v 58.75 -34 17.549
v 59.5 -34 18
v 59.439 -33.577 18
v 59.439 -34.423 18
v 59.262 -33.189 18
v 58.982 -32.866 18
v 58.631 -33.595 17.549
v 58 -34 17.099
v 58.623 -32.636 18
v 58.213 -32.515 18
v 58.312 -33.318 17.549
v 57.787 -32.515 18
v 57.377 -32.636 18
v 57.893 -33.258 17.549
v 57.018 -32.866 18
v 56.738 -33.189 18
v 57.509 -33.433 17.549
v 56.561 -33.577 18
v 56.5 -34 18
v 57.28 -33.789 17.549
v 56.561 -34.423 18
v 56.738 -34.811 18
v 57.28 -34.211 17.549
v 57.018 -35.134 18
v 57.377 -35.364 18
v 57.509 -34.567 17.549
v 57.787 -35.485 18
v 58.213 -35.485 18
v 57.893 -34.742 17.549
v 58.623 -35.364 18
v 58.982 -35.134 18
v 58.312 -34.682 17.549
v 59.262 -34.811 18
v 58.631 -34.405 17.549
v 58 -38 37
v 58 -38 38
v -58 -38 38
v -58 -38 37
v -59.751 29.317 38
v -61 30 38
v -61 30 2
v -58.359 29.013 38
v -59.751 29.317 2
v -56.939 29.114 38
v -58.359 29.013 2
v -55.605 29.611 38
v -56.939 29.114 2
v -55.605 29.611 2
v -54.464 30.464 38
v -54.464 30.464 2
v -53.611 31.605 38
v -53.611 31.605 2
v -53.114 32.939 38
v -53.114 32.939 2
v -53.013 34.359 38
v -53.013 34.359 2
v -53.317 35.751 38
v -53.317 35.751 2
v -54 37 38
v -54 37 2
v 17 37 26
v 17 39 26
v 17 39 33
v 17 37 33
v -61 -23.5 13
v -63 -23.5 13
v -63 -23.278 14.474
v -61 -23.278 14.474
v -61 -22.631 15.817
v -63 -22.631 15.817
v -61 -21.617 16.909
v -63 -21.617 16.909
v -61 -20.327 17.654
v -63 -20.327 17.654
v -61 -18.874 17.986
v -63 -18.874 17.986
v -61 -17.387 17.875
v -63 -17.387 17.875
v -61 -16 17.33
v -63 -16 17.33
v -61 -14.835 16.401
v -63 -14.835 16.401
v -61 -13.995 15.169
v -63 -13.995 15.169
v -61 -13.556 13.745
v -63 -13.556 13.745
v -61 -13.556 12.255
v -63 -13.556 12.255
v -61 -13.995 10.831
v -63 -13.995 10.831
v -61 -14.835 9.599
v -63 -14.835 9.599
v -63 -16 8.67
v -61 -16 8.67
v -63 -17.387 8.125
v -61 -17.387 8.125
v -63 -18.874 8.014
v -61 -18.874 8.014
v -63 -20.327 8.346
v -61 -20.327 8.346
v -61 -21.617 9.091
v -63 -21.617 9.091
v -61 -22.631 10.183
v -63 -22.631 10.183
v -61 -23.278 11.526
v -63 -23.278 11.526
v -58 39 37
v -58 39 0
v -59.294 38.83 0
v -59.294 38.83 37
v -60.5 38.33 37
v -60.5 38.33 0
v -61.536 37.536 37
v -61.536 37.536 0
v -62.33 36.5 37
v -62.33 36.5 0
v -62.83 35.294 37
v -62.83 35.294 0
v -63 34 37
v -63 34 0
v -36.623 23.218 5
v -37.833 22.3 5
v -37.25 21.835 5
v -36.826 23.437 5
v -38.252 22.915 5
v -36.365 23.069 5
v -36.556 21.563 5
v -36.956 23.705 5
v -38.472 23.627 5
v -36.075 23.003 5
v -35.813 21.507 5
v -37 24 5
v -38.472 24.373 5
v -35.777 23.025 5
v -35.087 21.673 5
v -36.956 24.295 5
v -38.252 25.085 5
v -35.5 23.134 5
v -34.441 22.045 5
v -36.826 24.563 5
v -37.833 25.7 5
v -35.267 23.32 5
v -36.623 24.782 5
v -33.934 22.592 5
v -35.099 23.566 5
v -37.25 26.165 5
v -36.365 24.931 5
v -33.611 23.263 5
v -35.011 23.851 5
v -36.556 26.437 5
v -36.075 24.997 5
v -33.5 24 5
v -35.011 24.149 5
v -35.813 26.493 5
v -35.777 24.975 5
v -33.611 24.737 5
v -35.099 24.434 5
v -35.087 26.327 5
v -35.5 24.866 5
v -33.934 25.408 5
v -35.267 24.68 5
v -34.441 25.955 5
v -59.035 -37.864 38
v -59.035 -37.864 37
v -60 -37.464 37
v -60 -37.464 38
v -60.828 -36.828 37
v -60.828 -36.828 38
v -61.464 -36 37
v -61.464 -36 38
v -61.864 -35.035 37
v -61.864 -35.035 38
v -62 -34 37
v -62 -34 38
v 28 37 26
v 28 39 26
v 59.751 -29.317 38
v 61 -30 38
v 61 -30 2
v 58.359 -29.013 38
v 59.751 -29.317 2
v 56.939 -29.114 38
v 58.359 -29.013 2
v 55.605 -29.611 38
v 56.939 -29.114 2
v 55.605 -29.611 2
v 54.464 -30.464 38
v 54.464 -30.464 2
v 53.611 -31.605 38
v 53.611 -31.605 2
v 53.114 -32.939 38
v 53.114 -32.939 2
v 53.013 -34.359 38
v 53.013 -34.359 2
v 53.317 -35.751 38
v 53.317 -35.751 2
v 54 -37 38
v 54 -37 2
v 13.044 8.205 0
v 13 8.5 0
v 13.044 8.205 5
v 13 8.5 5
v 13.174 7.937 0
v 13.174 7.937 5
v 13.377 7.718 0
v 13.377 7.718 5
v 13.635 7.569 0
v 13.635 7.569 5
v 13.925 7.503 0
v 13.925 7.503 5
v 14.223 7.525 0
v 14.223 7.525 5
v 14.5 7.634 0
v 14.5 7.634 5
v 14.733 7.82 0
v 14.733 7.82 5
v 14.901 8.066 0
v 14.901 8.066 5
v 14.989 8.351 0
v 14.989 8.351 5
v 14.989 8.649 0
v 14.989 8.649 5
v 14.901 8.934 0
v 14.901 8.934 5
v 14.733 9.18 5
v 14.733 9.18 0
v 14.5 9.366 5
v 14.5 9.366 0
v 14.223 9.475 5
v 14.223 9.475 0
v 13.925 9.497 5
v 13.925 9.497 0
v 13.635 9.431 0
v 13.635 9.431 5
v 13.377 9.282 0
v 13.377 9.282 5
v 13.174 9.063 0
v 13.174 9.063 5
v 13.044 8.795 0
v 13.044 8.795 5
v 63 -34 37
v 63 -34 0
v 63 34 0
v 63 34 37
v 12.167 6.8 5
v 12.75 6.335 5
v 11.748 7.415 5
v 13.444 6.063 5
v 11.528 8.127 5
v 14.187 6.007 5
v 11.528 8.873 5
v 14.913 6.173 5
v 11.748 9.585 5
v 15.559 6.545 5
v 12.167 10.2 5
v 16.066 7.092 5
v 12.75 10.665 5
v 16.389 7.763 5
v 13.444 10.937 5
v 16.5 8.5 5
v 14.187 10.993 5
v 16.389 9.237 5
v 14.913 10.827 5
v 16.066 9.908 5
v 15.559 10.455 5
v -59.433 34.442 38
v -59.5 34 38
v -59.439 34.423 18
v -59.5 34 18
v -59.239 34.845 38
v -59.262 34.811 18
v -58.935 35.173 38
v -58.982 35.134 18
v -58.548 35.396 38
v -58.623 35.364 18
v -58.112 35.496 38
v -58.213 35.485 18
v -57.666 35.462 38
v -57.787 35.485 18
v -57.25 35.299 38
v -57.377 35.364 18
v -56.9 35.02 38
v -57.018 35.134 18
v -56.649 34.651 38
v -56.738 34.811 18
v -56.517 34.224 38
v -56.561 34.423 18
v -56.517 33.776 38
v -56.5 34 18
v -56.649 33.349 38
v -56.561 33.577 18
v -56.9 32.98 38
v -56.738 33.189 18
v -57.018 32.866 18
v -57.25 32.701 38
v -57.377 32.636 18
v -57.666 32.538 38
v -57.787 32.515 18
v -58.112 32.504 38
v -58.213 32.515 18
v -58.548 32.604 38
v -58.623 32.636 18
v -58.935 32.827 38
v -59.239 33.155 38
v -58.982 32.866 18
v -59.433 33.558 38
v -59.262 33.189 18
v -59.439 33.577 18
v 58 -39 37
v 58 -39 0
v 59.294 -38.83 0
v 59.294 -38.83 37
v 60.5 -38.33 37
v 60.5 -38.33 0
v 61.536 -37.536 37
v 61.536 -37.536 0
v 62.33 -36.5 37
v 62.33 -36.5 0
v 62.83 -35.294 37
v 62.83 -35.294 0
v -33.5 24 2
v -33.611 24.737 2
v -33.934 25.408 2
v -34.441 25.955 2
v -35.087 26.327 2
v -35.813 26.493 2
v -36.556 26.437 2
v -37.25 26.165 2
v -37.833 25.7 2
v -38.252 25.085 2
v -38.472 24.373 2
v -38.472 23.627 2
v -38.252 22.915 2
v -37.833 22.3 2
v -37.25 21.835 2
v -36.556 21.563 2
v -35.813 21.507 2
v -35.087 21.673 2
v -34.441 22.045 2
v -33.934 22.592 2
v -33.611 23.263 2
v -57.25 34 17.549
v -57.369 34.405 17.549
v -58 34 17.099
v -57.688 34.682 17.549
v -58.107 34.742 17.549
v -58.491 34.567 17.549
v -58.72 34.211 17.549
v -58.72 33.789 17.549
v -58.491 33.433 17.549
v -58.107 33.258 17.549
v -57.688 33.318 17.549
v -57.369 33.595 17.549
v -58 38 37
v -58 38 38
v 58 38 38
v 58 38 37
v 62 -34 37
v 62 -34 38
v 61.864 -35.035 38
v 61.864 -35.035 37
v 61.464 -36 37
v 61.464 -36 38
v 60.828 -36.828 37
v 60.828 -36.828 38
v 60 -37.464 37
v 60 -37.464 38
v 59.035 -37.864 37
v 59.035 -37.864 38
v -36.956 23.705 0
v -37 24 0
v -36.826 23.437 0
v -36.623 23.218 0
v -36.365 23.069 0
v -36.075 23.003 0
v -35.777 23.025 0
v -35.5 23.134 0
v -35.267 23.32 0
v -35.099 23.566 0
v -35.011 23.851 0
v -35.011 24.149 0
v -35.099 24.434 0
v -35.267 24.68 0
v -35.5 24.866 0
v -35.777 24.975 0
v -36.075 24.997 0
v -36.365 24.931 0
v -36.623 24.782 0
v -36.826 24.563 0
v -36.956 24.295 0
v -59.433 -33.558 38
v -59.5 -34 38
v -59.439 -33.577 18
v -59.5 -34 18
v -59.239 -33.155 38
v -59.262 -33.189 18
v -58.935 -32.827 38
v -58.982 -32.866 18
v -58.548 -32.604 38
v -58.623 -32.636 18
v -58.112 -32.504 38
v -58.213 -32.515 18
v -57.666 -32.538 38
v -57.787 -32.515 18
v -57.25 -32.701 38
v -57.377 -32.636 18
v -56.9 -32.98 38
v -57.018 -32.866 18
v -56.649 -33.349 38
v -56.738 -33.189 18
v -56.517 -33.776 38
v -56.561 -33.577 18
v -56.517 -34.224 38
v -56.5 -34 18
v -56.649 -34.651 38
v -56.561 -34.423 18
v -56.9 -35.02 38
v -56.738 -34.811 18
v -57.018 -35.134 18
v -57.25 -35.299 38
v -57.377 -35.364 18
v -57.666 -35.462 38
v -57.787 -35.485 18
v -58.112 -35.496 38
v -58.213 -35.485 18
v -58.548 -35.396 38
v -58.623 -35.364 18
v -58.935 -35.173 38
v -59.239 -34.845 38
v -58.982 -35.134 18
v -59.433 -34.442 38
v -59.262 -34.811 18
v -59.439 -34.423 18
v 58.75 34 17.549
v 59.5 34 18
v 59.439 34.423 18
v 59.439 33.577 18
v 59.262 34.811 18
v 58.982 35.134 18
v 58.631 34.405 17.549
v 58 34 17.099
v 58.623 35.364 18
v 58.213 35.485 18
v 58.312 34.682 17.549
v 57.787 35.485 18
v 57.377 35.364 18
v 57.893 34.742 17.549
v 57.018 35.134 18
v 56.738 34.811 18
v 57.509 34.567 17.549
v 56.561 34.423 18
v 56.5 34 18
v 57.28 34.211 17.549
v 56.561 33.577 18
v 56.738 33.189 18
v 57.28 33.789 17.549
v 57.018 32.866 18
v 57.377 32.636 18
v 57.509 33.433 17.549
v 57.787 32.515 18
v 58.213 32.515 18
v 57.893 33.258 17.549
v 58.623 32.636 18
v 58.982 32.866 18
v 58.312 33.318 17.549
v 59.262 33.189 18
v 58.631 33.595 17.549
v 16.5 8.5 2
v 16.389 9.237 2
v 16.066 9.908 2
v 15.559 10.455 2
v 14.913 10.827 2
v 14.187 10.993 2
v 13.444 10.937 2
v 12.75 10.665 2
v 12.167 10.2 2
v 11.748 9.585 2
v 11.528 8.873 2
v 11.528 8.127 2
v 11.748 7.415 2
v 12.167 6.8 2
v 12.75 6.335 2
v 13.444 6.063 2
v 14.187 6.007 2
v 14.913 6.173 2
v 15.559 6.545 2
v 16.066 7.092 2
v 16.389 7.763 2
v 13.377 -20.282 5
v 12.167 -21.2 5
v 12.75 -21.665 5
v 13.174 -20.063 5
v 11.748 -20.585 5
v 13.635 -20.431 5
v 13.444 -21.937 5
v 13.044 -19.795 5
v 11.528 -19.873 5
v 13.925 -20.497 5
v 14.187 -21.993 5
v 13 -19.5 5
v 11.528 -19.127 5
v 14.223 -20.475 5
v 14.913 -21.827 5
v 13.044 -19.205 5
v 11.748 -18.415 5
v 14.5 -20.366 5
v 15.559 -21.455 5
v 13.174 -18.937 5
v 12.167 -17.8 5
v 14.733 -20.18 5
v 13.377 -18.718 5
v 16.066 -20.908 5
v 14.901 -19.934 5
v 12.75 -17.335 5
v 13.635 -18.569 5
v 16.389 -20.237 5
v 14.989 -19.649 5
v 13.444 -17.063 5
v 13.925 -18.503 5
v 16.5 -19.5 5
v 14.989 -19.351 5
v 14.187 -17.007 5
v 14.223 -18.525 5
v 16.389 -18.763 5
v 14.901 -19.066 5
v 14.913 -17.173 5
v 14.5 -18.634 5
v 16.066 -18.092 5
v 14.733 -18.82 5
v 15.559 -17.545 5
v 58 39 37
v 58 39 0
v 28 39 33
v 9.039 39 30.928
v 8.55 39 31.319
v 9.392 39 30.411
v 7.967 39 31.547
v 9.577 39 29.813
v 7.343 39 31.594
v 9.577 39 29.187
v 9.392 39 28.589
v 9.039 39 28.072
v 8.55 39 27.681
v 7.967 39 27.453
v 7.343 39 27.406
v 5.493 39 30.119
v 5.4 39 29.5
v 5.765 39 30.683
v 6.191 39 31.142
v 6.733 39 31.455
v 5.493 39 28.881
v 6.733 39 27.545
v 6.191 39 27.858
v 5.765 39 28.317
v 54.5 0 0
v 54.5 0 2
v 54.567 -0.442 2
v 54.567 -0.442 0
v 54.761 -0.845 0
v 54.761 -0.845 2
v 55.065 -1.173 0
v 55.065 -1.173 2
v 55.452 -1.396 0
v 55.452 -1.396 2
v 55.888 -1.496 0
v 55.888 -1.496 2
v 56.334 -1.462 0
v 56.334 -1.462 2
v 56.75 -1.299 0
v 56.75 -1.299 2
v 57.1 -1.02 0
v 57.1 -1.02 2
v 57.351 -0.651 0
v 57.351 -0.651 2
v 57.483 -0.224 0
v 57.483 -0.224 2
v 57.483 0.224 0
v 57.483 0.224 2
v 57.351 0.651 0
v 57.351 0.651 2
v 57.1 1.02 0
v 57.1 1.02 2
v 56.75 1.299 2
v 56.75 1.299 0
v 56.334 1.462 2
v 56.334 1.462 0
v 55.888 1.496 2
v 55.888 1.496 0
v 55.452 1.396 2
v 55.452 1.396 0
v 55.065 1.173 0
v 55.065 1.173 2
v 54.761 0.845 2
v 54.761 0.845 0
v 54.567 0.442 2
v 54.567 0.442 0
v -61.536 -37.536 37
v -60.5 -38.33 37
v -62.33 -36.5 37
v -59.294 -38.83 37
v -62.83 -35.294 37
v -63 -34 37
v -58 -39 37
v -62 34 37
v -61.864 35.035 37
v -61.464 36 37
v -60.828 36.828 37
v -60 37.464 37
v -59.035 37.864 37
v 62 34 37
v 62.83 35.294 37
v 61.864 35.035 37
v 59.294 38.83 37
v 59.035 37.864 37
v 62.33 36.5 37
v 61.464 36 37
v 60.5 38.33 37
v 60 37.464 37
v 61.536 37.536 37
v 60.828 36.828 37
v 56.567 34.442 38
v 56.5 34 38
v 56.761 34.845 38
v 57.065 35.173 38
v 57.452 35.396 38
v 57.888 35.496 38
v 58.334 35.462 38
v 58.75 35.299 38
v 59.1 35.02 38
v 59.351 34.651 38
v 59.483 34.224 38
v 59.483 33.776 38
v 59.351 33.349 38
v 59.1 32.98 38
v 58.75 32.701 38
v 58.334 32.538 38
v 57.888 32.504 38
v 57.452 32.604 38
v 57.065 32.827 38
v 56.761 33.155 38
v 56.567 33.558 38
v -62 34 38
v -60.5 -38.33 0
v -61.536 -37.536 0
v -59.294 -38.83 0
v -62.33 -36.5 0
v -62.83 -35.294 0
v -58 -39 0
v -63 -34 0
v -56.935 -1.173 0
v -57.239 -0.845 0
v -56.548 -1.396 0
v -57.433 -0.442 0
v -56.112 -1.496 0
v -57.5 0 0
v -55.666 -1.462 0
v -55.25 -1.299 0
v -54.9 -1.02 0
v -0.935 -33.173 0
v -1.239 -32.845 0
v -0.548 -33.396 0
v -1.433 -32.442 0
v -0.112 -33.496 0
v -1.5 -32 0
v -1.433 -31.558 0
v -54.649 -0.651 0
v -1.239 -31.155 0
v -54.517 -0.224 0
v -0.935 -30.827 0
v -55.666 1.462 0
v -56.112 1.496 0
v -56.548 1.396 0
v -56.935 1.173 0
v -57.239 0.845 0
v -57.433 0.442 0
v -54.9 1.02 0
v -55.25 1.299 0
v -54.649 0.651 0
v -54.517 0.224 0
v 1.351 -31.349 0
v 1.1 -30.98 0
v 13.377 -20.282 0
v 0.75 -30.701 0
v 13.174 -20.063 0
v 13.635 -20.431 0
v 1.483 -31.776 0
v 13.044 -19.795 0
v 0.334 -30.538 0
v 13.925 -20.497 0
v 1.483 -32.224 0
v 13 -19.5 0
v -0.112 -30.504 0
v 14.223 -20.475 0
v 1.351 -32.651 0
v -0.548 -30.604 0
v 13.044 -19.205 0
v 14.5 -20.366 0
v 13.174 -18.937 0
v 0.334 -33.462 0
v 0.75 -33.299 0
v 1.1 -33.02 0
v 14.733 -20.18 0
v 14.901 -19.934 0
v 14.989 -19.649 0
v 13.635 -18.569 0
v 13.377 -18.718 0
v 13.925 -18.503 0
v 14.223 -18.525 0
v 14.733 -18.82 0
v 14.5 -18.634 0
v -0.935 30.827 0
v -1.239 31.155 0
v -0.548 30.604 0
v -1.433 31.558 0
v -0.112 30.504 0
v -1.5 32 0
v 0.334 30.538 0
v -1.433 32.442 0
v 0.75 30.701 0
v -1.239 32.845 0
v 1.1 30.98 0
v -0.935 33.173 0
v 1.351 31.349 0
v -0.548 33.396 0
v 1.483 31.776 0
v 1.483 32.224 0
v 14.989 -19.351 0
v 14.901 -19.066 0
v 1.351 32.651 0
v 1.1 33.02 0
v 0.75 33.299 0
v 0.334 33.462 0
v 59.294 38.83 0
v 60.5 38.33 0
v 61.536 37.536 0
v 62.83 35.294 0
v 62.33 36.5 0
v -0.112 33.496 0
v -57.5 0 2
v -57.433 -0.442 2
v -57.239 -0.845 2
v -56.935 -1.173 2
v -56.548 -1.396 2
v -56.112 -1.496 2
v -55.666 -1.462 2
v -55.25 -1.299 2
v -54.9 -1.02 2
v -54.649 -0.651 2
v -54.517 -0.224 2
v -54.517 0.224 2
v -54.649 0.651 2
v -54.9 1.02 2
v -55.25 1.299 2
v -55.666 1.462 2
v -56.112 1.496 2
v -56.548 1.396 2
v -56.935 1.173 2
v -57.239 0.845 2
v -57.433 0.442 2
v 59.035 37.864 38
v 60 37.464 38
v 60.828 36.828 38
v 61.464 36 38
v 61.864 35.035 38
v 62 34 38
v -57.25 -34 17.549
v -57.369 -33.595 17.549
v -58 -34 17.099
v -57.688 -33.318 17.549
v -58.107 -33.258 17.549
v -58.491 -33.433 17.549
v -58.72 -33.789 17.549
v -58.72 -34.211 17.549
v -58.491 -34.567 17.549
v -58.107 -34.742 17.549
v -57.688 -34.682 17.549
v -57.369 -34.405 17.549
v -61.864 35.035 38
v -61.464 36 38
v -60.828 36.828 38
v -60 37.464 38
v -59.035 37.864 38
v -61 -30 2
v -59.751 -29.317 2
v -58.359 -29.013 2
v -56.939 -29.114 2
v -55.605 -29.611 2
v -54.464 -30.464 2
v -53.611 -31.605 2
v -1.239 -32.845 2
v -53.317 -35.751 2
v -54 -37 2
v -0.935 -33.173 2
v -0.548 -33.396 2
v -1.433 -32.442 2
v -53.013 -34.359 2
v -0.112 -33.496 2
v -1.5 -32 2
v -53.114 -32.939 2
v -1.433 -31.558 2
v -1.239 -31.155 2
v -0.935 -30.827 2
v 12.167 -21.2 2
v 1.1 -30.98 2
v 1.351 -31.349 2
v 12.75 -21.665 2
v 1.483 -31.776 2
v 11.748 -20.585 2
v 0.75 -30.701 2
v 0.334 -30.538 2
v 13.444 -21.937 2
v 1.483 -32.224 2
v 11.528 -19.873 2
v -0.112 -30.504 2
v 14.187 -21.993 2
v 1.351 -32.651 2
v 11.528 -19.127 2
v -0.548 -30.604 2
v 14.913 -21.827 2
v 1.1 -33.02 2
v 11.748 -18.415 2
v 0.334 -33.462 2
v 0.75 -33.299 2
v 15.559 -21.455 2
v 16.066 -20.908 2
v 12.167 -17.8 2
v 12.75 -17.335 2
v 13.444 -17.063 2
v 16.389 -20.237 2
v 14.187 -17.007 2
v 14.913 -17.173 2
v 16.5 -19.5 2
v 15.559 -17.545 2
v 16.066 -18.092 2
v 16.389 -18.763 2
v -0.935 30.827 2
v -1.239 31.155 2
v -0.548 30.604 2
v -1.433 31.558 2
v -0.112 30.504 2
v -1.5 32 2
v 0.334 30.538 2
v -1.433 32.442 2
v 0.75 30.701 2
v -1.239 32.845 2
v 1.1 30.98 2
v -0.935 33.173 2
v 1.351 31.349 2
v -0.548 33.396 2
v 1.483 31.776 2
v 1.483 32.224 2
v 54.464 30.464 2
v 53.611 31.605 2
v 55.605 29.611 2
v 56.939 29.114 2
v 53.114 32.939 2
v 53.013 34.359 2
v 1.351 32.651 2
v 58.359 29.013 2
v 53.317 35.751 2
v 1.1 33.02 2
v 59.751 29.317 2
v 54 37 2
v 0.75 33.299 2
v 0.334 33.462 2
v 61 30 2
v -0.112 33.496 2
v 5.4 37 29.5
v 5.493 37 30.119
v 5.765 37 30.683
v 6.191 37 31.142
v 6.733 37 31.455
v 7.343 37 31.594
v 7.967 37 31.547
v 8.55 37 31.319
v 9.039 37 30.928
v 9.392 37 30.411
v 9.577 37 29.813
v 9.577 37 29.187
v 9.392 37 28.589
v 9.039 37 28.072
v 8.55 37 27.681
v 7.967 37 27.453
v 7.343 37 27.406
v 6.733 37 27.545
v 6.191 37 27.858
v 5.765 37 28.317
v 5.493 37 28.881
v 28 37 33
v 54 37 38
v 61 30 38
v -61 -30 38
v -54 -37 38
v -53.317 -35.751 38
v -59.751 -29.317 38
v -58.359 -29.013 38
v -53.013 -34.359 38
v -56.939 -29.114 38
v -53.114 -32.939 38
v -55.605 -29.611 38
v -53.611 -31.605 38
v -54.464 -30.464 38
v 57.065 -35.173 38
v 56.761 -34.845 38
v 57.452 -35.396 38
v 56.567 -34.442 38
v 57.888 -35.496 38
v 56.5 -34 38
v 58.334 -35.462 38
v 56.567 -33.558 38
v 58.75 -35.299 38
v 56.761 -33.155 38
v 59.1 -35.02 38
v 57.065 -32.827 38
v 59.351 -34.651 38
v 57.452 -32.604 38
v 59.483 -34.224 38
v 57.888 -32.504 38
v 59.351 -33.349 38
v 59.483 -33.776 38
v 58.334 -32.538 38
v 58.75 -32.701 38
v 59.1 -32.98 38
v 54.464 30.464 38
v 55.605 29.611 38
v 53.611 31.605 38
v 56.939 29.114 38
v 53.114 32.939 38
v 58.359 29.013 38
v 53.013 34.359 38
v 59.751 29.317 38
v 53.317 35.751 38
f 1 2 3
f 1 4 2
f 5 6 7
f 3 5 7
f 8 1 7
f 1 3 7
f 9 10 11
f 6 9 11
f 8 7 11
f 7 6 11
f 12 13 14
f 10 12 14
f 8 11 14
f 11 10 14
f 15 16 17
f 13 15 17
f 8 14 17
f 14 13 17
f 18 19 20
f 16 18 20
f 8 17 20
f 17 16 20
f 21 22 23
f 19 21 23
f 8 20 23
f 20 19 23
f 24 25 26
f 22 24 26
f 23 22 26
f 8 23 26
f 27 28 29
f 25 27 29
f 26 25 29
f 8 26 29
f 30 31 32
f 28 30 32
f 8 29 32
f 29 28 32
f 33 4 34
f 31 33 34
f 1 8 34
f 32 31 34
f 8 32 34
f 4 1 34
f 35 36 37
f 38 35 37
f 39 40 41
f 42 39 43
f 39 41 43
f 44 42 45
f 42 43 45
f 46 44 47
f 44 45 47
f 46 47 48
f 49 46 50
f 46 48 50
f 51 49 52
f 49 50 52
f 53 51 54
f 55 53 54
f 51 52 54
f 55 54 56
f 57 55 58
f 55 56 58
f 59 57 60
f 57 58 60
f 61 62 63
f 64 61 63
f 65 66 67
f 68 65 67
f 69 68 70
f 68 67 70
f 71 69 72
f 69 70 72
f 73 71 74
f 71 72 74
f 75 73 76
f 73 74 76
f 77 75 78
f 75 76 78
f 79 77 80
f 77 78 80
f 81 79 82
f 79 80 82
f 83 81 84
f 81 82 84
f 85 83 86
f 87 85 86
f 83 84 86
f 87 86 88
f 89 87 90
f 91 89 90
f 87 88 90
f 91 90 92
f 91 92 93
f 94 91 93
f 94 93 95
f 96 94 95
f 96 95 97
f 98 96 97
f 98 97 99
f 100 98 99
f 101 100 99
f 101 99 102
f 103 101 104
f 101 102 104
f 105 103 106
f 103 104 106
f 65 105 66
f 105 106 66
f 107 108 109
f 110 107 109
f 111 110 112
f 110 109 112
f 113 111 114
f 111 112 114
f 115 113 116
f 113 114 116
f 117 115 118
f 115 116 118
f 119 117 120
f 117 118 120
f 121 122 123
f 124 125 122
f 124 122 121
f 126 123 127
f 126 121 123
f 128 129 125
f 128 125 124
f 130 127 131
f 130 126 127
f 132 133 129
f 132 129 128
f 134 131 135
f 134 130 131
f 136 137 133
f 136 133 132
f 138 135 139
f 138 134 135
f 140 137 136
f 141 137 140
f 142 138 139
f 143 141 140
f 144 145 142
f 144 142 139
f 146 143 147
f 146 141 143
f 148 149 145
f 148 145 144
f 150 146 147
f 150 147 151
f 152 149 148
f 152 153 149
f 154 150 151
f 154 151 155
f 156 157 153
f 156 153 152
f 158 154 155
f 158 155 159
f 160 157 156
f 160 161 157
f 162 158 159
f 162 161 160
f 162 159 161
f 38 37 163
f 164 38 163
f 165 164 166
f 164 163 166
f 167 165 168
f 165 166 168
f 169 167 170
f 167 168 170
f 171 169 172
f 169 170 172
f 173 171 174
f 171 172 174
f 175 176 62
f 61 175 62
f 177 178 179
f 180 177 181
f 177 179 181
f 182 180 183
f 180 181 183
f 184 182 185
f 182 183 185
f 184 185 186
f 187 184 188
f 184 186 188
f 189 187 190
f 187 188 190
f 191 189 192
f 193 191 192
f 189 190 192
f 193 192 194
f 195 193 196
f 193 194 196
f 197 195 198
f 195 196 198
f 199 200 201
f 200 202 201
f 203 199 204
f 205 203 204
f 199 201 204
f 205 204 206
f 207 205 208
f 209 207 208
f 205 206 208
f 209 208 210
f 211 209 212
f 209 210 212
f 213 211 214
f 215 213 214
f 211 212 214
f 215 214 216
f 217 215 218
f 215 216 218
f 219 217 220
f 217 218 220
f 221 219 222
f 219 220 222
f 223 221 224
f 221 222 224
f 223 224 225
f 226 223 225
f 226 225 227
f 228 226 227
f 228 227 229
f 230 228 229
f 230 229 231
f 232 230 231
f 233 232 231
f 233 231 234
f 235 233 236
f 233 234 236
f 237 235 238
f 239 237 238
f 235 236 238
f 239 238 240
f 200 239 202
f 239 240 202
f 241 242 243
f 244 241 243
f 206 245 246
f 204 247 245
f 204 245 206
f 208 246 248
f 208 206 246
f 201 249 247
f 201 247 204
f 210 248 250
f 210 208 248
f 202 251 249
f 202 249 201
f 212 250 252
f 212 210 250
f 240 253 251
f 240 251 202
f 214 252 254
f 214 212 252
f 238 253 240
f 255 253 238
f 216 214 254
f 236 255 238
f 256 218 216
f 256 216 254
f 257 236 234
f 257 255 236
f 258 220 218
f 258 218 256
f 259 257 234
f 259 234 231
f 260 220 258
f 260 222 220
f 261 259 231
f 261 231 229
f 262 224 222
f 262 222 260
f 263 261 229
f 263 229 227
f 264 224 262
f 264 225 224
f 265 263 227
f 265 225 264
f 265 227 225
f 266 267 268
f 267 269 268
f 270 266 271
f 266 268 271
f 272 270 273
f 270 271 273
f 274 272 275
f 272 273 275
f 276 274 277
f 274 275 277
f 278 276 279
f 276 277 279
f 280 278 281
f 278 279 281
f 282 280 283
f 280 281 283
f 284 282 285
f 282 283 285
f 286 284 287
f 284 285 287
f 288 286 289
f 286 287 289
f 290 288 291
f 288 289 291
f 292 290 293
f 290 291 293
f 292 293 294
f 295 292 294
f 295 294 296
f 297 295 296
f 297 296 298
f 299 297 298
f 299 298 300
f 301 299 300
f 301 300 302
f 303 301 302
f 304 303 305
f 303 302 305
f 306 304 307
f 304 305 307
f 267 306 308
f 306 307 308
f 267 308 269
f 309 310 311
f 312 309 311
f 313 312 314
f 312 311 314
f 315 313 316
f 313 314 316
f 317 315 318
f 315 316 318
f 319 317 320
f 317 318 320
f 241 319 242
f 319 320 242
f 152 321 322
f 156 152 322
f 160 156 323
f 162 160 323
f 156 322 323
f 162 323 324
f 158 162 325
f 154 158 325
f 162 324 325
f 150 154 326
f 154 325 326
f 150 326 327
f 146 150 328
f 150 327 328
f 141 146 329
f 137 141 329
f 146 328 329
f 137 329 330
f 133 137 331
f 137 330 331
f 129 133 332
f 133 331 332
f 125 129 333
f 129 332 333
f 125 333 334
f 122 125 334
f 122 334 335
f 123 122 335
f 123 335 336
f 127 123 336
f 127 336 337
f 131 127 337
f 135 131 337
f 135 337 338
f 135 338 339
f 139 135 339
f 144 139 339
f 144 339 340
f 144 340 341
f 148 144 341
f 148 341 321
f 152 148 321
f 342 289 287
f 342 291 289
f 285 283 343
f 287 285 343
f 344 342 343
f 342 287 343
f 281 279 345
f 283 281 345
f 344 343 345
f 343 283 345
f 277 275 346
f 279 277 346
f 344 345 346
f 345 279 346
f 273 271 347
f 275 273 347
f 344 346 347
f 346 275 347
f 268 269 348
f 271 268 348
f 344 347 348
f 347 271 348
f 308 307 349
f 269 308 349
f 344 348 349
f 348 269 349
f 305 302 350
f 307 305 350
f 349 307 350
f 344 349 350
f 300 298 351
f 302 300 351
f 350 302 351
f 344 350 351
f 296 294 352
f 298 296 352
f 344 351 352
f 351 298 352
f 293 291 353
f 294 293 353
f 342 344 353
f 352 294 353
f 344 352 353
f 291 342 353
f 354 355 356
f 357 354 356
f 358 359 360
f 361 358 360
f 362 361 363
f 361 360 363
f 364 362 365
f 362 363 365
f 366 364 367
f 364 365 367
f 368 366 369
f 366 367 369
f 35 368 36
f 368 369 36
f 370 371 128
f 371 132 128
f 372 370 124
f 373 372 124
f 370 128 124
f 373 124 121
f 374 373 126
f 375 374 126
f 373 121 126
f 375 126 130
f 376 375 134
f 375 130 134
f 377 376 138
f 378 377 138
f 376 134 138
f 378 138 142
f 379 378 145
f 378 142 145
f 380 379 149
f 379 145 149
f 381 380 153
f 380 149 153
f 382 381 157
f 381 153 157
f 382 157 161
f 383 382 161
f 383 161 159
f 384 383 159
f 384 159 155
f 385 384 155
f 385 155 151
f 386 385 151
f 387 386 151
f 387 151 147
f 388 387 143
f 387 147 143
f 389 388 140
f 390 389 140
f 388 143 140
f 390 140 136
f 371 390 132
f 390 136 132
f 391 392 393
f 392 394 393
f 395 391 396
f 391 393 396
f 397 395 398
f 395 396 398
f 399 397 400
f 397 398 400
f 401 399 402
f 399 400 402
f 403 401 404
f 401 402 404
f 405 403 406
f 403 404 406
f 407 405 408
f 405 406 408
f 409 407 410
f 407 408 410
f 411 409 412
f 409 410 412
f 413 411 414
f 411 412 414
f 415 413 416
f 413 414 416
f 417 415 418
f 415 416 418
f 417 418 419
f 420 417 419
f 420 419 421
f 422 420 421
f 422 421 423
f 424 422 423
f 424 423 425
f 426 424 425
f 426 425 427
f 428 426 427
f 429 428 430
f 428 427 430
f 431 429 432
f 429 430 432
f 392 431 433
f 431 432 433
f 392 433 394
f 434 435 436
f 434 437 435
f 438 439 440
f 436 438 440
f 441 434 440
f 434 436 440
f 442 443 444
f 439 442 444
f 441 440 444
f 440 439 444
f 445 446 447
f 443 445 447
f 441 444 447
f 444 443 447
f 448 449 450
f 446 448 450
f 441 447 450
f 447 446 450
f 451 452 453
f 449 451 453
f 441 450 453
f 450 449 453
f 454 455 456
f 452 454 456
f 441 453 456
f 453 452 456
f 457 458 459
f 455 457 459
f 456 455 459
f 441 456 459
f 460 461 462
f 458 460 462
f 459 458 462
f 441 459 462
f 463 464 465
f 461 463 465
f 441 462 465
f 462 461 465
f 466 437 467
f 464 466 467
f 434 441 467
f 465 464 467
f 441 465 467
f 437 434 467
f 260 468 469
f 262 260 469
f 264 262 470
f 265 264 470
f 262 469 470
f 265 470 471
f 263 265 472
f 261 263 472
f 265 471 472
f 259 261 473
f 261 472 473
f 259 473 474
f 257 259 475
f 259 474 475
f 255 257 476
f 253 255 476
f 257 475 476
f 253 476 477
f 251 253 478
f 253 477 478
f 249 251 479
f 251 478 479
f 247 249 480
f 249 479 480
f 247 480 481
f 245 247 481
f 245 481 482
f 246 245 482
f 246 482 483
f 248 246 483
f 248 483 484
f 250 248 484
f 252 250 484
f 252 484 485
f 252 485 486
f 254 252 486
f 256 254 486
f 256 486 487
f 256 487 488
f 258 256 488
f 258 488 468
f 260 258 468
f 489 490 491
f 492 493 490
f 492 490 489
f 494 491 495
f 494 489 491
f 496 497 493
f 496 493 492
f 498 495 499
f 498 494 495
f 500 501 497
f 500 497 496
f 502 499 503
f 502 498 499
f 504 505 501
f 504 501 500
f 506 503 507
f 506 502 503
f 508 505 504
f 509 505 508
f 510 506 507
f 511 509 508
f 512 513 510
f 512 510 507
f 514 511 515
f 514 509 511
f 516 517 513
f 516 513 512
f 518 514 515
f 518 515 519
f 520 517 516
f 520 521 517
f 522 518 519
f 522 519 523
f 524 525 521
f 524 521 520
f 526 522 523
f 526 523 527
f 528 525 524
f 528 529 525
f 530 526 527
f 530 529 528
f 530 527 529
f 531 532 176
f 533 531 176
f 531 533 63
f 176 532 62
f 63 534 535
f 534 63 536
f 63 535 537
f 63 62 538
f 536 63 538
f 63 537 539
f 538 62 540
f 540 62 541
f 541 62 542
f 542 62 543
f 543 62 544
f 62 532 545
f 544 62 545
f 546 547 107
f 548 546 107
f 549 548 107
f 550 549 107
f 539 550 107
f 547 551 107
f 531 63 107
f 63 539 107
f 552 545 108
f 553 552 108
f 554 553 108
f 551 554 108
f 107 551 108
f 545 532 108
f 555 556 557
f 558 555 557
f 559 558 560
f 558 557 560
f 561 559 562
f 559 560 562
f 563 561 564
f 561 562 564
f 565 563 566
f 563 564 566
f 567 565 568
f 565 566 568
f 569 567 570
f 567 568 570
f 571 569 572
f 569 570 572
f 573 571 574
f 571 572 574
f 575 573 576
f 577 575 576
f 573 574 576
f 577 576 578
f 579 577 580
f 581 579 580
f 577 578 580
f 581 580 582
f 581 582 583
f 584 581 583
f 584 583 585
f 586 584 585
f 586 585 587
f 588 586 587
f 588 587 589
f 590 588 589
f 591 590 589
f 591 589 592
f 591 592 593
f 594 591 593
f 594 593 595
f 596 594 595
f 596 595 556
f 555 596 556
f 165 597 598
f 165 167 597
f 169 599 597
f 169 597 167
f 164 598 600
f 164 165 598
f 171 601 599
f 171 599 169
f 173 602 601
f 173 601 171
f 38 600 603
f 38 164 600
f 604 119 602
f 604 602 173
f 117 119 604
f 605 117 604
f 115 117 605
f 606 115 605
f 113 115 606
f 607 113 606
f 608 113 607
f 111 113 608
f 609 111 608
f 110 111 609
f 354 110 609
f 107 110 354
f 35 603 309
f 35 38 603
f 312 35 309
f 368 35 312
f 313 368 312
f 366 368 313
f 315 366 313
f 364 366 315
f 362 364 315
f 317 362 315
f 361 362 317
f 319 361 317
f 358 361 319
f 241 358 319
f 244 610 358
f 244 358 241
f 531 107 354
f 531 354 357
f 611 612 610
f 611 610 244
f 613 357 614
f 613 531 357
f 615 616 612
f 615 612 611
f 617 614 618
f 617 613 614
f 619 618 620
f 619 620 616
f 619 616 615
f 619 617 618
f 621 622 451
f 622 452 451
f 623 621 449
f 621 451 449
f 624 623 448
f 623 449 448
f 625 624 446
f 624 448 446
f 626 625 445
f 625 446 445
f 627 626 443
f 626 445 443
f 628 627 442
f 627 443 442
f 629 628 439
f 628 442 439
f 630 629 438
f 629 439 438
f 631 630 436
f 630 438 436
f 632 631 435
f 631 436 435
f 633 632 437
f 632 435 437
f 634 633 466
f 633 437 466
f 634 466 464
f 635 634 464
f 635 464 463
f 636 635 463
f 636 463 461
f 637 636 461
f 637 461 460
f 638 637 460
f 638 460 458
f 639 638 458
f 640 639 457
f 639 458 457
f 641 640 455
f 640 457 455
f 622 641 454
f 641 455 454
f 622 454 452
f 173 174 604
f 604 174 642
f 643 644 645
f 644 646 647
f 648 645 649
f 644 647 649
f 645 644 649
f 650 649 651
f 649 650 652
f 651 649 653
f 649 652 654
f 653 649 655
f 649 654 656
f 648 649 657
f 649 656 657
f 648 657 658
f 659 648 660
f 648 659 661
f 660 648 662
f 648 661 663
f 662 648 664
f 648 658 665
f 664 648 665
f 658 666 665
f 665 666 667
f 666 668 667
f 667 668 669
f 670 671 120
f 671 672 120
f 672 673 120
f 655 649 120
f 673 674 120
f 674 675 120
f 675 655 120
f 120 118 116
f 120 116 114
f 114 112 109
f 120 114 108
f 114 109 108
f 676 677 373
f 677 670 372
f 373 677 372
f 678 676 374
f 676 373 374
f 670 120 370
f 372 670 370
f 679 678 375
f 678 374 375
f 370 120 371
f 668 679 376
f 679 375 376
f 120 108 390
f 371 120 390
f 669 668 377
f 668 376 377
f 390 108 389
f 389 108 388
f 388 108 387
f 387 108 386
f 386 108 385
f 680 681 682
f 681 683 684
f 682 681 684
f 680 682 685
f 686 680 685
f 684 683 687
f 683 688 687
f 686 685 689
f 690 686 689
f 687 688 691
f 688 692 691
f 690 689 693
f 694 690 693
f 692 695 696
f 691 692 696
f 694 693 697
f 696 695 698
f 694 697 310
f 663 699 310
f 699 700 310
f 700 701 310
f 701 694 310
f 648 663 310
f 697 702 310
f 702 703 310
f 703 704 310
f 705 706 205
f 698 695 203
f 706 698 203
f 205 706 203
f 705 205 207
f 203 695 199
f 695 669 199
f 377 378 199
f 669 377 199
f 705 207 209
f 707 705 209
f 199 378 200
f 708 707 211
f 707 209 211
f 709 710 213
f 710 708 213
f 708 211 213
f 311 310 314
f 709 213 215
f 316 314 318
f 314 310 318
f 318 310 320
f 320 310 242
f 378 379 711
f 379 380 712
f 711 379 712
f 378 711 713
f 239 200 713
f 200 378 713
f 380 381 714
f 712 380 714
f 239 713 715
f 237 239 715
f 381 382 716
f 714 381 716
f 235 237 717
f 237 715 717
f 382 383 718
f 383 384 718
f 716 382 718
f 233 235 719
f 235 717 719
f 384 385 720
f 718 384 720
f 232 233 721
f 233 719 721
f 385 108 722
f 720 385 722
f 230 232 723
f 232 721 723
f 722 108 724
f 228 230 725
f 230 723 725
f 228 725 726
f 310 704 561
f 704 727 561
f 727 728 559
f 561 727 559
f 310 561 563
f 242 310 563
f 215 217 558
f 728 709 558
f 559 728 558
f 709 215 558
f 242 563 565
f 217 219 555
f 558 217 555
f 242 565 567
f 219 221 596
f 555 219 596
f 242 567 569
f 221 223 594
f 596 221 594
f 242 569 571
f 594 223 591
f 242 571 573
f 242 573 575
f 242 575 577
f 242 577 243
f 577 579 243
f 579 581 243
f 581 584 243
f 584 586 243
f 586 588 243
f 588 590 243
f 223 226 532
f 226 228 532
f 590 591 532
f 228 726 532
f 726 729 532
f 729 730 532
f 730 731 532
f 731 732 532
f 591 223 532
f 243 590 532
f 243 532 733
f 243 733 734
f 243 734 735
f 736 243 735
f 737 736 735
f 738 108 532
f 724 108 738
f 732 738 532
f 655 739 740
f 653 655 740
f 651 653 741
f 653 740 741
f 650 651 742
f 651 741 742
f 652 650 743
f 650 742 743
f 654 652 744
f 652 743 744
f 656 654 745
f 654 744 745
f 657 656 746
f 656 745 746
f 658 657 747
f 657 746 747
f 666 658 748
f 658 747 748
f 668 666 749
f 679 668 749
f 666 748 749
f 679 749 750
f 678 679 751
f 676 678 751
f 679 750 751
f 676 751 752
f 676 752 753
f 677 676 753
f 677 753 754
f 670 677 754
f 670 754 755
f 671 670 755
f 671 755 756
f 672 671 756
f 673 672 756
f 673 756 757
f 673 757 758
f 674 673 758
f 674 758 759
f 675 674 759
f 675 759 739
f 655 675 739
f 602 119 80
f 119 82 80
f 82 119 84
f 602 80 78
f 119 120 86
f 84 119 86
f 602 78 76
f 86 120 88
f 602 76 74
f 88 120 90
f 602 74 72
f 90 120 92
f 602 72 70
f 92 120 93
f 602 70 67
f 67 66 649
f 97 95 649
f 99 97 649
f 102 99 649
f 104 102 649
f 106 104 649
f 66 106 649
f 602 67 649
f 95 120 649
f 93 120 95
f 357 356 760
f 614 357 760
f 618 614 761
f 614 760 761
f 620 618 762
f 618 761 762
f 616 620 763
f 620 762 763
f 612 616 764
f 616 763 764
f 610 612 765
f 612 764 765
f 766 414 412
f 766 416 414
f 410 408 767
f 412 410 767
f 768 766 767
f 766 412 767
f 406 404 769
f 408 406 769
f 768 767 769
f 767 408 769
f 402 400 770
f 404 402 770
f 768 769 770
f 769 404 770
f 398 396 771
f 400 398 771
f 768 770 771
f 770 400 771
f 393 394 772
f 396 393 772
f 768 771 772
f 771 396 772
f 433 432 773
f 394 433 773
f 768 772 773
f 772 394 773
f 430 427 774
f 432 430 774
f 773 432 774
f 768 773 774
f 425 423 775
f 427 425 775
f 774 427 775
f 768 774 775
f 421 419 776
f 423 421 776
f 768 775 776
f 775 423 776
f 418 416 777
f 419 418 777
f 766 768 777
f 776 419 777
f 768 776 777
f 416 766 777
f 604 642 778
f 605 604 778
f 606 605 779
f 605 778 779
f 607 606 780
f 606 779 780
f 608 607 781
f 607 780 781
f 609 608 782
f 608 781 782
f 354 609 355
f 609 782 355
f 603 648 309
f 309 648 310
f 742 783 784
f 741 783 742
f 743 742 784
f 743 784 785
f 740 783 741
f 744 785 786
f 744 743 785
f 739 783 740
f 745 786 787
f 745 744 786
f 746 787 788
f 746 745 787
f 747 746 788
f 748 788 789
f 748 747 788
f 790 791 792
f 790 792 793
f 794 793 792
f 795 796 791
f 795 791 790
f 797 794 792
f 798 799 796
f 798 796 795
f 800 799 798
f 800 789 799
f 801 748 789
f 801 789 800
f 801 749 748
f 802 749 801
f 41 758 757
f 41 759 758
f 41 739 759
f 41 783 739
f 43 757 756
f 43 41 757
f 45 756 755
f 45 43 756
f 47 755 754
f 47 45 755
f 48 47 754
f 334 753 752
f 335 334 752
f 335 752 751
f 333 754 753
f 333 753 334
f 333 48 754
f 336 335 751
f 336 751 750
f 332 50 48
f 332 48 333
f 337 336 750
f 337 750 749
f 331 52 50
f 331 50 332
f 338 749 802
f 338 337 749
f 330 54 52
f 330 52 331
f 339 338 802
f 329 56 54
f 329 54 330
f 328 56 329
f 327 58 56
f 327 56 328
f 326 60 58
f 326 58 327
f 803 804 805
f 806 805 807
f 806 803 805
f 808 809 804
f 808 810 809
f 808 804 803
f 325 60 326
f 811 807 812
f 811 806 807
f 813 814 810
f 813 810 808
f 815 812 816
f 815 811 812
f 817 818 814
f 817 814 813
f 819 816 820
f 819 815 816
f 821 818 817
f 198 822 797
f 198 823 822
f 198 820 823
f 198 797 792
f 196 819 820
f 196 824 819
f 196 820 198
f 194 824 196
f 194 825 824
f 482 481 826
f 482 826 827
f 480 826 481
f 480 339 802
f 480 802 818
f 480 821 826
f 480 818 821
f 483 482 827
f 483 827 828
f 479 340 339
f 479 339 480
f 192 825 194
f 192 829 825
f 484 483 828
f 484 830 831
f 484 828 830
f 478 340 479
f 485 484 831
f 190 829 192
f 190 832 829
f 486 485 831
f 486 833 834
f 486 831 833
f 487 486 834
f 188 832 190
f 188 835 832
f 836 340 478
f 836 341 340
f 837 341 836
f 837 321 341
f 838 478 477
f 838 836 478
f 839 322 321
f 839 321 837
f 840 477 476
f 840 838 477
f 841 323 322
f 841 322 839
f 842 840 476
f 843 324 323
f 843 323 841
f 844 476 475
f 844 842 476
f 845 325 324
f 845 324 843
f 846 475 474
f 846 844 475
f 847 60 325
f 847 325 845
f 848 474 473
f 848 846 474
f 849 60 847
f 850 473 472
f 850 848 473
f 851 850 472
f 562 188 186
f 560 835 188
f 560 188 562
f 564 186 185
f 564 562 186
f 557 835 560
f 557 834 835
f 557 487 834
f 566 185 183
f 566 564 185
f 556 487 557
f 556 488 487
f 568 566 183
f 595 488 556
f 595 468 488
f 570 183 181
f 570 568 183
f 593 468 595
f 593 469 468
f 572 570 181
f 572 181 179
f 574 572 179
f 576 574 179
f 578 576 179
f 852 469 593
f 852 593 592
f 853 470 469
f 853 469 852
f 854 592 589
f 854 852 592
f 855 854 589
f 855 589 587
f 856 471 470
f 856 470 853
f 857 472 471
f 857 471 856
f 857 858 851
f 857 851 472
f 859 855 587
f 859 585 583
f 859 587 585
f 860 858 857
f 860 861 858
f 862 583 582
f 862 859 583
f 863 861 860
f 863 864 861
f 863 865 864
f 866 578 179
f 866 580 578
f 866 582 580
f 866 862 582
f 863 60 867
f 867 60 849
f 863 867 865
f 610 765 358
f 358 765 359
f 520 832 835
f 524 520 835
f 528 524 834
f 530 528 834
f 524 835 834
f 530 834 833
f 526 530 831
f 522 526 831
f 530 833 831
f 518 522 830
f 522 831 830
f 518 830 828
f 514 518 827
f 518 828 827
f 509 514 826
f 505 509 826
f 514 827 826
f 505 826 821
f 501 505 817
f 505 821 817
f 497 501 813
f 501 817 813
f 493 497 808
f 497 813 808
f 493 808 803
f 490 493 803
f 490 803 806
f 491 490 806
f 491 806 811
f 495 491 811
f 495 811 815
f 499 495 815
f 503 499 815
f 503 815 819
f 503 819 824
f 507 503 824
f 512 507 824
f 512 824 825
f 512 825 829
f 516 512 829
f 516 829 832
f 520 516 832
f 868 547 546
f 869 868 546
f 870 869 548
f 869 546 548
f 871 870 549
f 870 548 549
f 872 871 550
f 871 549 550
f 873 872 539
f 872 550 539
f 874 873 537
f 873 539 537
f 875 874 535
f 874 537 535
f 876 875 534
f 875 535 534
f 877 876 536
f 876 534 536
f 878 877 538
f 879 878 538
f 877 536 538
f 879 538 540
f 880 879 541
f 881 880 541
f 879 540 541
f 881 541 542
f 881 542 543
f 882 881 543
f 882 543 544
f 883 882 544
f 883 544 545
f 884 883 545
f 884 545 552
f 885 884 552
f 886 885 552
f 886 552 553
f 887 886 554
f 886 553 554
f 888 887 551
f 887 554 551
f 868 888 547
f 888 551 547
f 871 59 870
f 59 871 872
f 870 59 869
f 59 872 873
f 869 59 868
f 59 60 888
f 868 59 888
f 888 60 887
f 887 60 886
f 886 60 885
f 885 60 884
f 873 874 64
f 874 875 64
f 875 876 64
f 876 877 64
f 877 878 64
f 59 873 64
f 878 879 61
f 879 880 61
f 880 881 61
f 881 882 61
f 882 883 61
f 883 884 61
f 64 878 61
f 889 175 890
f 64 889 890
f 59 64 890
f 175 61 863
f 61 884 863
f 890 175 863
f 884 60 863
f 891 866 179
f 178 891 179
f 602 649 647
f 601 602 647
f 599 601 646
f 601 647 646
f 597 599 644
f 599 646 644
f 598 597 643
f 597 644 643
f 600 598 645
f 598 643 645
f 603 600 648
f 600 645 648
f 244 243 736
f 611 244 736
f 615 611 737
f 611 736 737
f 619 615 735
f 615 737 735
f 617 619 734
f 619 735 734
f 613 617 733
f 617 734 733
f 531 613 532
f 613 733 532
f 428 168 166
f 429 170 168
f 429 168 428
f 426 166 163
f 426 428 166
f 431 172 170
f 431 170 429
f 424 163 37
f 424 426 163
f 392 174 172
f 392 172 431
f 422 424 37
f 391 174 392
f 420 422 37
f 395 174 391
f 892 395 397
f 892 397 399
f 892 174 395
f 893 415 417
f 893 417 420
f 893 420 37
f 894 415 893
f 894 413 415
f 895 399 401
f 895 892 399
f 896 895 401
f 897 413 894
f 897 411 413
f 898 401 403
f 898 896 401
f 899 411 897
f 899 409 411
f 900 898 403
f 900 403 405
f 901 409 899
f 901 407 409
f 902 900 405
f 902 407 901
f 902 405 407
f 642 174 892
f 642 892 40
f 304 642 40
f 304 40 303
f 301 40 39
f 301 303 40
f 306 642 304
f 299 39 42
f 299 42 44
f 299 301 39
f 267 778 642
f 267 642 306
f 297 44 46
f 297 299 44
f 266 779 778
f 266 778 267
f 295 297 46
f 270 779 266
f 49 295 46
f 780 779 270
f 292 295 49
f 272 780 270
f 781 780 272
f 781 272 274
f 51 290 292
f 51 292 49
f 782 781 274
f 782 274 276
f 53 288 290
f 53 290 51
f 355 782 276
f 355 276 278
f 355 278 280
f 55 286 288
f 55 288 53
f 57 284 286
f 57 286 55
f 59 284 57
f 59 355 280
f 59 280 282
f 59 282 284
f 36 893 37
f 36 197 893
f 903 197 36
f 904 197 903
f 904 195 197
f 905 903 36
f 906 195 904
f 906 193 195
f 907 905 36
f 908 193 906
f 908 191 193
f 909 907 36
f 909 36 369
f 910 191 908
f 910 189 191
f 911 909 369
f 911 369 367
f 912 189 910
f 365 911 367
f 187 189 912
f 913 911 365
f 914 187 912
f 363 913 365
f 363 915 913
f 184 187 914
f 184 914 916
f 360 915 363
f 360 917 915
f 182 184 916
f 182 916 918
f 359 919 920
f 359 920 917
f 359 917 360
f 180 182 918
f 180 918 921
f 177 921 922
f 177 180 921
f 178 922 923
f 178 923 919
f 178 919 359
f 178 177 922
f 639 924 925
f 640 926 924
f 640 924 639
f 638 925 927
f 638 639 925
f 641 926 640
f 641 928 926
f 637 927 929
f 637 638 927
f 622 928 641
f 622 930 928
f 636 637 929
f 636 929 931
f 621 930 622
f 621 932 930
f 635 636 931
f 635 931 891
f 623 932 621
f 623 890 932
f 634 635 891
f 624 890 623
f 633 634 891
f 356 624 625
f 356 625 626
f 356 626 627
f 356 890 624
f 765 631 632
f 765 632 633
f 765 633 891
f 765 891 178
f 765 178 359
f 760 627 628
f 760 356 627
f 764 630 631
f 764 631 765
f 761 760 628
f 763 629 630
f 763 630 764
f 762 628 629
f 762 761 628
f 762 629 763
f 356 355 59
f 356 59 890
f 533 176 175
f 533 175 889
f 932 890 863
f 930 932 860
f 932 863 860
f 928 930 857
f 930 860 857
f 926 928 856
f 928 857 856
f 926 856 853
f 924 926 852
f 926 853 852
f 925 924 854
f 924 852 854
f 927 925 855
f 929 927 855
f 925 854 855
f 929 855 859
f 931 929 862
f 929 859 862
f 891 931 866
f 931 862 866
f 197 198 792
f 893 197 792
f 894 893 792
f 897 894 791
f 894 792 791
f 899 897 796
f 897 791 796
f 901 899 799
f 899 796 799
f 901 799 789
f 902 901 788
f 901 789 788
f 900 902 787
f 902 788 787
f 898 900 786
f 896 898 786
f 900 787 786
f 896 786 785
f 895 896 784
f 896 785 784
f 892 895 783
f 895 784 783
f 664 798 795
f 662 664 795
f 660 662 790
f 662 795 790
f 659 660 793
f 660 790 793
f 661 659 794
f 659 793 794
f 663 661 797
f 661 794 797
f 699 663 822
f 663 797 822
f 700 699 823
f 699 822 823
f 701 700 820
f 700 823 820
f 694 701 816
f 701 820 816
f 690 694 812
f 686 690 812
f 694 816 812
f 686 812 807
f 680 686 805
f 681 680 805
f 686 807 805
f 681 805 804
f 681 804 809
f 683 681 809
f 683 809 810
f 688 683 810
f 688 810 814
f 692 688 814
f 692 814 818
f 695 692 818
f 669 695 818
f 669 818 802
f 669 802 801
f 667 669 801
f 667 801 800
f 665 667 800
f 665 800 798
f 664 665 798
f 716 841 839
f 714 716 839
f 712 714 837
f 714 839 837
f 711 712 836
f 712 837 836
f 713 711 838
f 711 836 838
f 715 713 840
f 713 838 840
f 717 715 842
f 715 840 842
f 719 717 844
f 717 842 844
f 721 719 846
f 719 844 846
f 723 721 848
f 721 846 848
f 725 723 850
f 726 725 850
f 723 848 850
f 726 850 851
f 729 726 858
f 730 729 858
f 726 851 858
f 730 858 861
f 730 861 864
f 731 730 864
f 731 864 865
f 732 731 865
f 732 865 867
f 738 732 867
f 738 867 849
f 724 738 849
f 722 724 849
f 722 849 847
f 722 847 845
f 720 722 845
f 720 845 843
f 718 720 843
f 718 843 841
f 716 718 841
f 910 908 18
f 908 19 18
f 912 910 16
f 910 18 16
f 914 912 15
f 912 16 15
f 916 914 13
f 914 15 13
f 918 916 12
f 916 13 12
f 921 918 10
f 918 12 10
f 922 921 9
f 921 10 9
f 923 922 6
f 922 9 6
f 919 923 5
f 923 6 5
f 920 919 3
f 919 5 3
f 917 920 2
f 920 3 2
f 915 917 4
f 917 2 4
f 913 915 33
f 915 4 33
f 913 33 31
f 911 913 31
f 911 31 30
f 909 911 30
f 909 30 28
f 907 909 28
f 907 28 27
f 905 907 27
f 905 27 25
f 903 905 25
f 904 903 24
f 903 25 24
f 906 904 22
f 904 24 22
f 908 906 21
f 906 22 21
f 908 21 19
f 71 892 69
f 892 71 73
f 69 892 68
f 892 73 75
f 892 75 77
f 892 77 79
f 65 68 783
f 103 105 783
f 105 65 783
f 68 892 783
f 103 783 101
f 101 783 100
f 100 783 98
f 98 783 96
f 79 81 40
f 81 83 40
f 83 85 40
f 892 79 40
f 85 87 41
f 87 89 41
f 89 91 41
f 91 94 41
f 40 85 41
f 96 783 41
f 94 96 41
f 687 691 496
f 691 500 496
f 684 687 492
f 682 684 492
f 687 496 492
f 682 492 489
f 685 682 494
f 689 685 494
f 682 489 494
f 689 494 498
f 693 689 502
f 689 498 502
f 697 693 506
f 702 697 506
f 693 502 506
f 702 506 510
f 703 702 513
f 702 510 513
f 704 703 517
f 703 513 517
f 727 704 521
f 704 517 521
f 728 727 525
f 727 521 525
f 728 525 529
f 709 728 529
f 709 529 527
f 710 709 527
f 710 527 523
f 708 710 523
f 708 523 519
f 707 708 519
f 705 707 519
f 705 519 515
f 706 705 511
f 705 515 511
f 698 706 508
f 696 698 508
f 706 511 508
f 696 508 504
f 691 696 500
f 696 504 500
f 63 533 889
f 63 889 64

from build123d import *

# Parameters (mm, degrees)
F0_W      = 102
F0_H      = 54
F0_R      = 2.5
F1_DEPTH  = 2
F2_DEPTH  = 5
F3_DEPTH  = 38
F4_D      = 3
F4_DEPTH  = 5
F4_TIP    = 0.9012909285
F6_D      = 3
F6_DEPTH  = 20
F6_TIP    = 0.9012909285
F7_DEPTH  = 1
F8_R      = 5
F9_DEPTH  = 2
F10_W     = 11
F10_H     = 7
F10_R     = 2.1
F11_DEPTH = 2
F12_D     = 2
F12_DEPTH = 5
F12_TIP   = 0.600860619


with BuildPart() as f1:
    # F0 (on Top) → F1 (new body)
    with BuildSketch(Plane.XY):
        with BuildLine():
            Line((54, 37), (-54, 37))
            ThreePointArc((-54, 37), (-54.4644660941, 30.4644660941), (-61, 30))
            Line((-61, 30), (-61, -30))
            ThreePointArc((-61, -30), (-54.4644660941, -30.4644660941), (-54, -37))
            Line((-54, -37), (54, -37))
            ThreePointArc((54, -37), (54.4644660941, -30.4644660941), (61, -30))
            Line((61, -30), (61, 30))
            ThreePointArc((61, 30), (54.4644660941, 30.4644660941), (54, 37))
        make_face()
        Rectangle(F0_W, F0_H, mode=Mode.SUBTRACT)
        Rectangle(F0_W, F0_H)
        with Locations((14, -19.5)):
            Circle(F0_R, mode=Mode.SUBTRACT)
        with Locations((-36, 24)):
            Circle(F0_R, mode=Mode.SUBTRACT)
        with Locations((14, 8.5)):
            Circle(F0_R, mode=Mode.SUBTRACT)
    extrude(amount=F1_DEPTH)

    # F0 (on Top) → F2 (join)
    with BuildSketch(Plane.XY):
        with Locations((-36, 24)):
            Circle(F0_R)
        with Locations((14, 8.5)):
            Circle(F0_R)
        with Locations((14, -19.5)):
            Circle(F0_R)
    extrude(amount=F2_DEPTH)

    # F0 (on Top) → F3 (join)
    with BuildSketch(Plane.XY):
        with BuildLine():
            ThreePointArc((-61, 32), (-59.5355339059, 35.5355339059), (-56, 37))
            Line((-56, 37), (-54, 37))
            ThreePointArc((-54, 37), (-55.7639320225, 38.472135955), (-58, 39))
            ThreePointArc((-58, 39), (-61.5355339059, 37.5355339059), (-63, 34))
            ThreePointArc((-63, 34), (-62.472135955, 31.7639320225), (-61, 30))
            Line((-61, 30), (-61, 32))
        make_face()
        with BuildLine():
            ThreePointArc((58, 39), (55.7639320225, 38.472135955), (54, 37))
            Line((54, 37), (56, 37))
            ThreePointArc((56, 37), (59.5355339059, 35.5355339059), (61, 32))
            Line((61, 32), (61, 30))
            ThreePointArc((61, 30), (62.472135955, 31.7639320225), (63, 34))
            ThreePointArc((63, 34), (61.5355339059, 37.5355339059), (58, 39))
        make_face()
        with BuildLine():
            Line((56, 37), (54, 37))
            ThreePointArc((54, 37), (54.4644660941, 30.4644660941), (61, 30))
            Line((61, 30), (61, 32))
            ThreePointArc((61, 32), (59.5355339059, 35.5355339059), (56, 37))
        make_face()
        with BuildLine():
            Line((-54, 37), (-56, 37))
            ThreePointArc((-56, 37), (-59.5355339059, 35.5355339059), (-61, 32))
            Line((-61, 32), (-61, 30))
            ThreePointArc((-61, 30), (-54.4644660941, 30.4644660941), (-54, 37))
        make_face()
        with BuildLine():
            Line((-61, -30), (-61, 30))
            ThreePointArc((-61, 30), (-62.472135955, 31.7639320225), (-63, 34))
            Line((-63, 34), (-63, -34))
            ThreePointArc((-63, -34), (-62.472135955, -31.7639320225), (-61, -30))
        make_face()
        with BuildLine():
            ThreePointArc((-58, 39), (-55.7639320225, 38.472135955), (-54, 37))
            Line((-54, 37), (54, 37))
            ThreePointArc((54, 37), (55.7639320225, 38.472135955), (58, 39))
            Line((58, 39), (-58, 39))
        make_face()
        with BuildLine():
            ThreePointArc((63, 34), (62.472135955, 31.7639320225), (61, 30))
            Line((61, 30), (61, -30))
            ThreePointArc((61, -30), (62.472135955, -31.7639320225), (63, -34))
            Line((63, -34), (63, 34))
        make_face()
        with BuildLine():
            Line((61, -32), (61, -30))
            ThreePointArc((61, -30), (54.4644660941, -30.4644660941), (54, -37))
            Line((54, -37), (56, -37))
            ThreePointArc((56, -37), (59.5355339059, -35.5355339059), (61, -32))
        make_face()
        with BuildLine():
            ThreePointArc((-54, -37), (-54.4644660941, -30.4644660941), (-61, -30))
            Line((-61, -30), (-61, -32))
            ThreePointArc((-61, -32), (-59.5355339059, -35.5355339059), (-56, -37))
            Line((-56, -37), (-54, -37))
        make_face()
        with BuildLine():
            Line((-61, -32), (-61, -30))
            ThreePointArc((-61, -30), (-62.472135955, -31.7639320225), (-63, -34))
            ThreePointArc((-63, -34), (-61.5355339059, -37.5355339059), (-58, -39))
            ThreePointArc((-58, -39), (-55.7639320225, -38.472135955), (-54, -37))
            Line((-54, -37), (-56, -37))
            ThreePointArc((-56, -37), (-59.5355339059, -35.5355339059), (-61, -32))
        make_face()
        with BuildLine():
            Line((54, -37), (-54, -37))
            ThreePointArc((-54, -37), (-55.7639320225, -38.472135955), (-58, -39))
            Line((-58, -39), (58, -39))
            ThreePointArc((58, -39), (55.7639320225, -38.472135955), (54, -37))
        make_face()
        with BuildLine():
            ThreePointArc((63, -34), (62.472135955, -31.7639320225), (61, -30))
            Line((61, -30), (61, -32))
            ThreePointArc((61, -32), (59.5355339059, -35.5355339059), (56, -37))
            Line((56, -37), (54, -37))
            ThreePointArc((54, -37), (55.7639320225, -38.472135955), (58, -39))
            ThreePointArc((58, -39), (61.5355339059, -37.5355339059), (63, -34))
        make_face()
    extrude(amount=F3_DEPTH)

    # F4
    with Locations(Plane(origin=(0, 0, 0), x_dir=(1, 0, 0), z_dir=(0, 0, -1))):
        with Locations((56, 0), (-56, 0), (0, 32), (0, -32)):
            Hole(F4_D / 2, depth=F4_DEPTH)
            with Locations((0, 0, -(F4_DEPTH + F4_TIP / 2))):  # 118° drill point
                Cone(0, F4_D / 2, F4_TIP, mode=Mode.SUBTRACT)

    # F6
    with Locations(Plane.XY.offset(38)):
        with Locations((-58, 34), (58, 34), (58, -34), (-58, -34)):
            Hole(F6_D / 2, depth=F6_DEPTH)
            with Locations((0, 0, -(F6_DEPTH + F6_TIP / 2))):  # 118° drill point
                Cone(0, F6_D / 2, F6_TIP, mode=Mode.SUBTRACT)

    # F5 (on face) → F7 (cut)
    with BuildSketch(Plane.XY.offset(38)):
        with BuildLine():
            ThreePointArc((58, -39), (61.5355339059, -37.5355339059), (63, -34))
            Line((63, -34), (63, 34))
            ThreePointArc((63, 34), (61.5355339059, 37.5355339059), (58, 39))
            Line((58, 39), (-58, 39))
            ThreePointArc((-58, 39), (-61.5355339059, 37.5355339059), (-63, 34))
            Line((-63, 34), (-63, -34))
            ThreePointArc((-63, -34), (-61.5355339059, -37.5355339059), (-58, -39))
            Line((-58, -39), (58, -39))
        make_face()
        with BuildLine():
            ThreePointArc((58, 38), (60.8284271247, 36.8284271247), (62, 34))
            Line((62, 34), (62, -34))
            ThreePointArc((62, -34), (60.8284271247, -36.8284271247), (58, -38))
            Line((58, -38), (-58, -38))
            ThreePointArc((-58, -38), (-60.8284271247, -36.8284271247), (-62, -34))
            Line((-62, -34), (-62, 34))
            ThreePointArc((-62, 34), (-60.8284271247, 36.8284271247), (-58, 38))
            Line((-58, 38), (58, 38))
        make_face(mode=Mode.SUBTRACT)
    extrude(amount=-F7_DEPTH, mode=Mode.SUBTRACT)

    # F8 (on face) → F9 (cut, through all)
    with BuildSketch(Plane(origin=(-63, 0, 0), x_dir=(0, -1, 0), z_dir=(-1, 0, 0))):
        with Locations((18.5, 13)):
            Circle(F8_R)
    extrude(amount=-F9_DEPTH, mode=Mode.SUBTRACT)

    # F10 (on face) → F11 (cut, through all)
    with BuildSketch(Plane(origin=(0, 39, 0), x_dir=(-1, 0, 0), z_dir=(0, 1, 0))):
        with Locations((-22.5, 29.5)):
            Rectangle(F10_W, F10_H)
        with Locations((-7.5, 29.5)):
            Circle(F10_R)
    extrude(amount=-F11_DEPTH, mode=Mode.SUBTRACT)

    # F12
    with Locations(Plane(origin=(0, 0, 0), x_dir=(1, 0, 0), z_dir=(0, 0, -1))):
        with Locations((-36, -24), (14, -8.5), (14, 19.5)):
            Hole(F12_D / 2, depth=F12_DEPTH)
            with Locations((0, 0, -(F12_DEPTH + F12_TIP / 2))):  # 118° drill point
                Cone(0, F12_D / 2, F12_TIP, mode=Mode.SUBTRACT)


solid = f1.part
